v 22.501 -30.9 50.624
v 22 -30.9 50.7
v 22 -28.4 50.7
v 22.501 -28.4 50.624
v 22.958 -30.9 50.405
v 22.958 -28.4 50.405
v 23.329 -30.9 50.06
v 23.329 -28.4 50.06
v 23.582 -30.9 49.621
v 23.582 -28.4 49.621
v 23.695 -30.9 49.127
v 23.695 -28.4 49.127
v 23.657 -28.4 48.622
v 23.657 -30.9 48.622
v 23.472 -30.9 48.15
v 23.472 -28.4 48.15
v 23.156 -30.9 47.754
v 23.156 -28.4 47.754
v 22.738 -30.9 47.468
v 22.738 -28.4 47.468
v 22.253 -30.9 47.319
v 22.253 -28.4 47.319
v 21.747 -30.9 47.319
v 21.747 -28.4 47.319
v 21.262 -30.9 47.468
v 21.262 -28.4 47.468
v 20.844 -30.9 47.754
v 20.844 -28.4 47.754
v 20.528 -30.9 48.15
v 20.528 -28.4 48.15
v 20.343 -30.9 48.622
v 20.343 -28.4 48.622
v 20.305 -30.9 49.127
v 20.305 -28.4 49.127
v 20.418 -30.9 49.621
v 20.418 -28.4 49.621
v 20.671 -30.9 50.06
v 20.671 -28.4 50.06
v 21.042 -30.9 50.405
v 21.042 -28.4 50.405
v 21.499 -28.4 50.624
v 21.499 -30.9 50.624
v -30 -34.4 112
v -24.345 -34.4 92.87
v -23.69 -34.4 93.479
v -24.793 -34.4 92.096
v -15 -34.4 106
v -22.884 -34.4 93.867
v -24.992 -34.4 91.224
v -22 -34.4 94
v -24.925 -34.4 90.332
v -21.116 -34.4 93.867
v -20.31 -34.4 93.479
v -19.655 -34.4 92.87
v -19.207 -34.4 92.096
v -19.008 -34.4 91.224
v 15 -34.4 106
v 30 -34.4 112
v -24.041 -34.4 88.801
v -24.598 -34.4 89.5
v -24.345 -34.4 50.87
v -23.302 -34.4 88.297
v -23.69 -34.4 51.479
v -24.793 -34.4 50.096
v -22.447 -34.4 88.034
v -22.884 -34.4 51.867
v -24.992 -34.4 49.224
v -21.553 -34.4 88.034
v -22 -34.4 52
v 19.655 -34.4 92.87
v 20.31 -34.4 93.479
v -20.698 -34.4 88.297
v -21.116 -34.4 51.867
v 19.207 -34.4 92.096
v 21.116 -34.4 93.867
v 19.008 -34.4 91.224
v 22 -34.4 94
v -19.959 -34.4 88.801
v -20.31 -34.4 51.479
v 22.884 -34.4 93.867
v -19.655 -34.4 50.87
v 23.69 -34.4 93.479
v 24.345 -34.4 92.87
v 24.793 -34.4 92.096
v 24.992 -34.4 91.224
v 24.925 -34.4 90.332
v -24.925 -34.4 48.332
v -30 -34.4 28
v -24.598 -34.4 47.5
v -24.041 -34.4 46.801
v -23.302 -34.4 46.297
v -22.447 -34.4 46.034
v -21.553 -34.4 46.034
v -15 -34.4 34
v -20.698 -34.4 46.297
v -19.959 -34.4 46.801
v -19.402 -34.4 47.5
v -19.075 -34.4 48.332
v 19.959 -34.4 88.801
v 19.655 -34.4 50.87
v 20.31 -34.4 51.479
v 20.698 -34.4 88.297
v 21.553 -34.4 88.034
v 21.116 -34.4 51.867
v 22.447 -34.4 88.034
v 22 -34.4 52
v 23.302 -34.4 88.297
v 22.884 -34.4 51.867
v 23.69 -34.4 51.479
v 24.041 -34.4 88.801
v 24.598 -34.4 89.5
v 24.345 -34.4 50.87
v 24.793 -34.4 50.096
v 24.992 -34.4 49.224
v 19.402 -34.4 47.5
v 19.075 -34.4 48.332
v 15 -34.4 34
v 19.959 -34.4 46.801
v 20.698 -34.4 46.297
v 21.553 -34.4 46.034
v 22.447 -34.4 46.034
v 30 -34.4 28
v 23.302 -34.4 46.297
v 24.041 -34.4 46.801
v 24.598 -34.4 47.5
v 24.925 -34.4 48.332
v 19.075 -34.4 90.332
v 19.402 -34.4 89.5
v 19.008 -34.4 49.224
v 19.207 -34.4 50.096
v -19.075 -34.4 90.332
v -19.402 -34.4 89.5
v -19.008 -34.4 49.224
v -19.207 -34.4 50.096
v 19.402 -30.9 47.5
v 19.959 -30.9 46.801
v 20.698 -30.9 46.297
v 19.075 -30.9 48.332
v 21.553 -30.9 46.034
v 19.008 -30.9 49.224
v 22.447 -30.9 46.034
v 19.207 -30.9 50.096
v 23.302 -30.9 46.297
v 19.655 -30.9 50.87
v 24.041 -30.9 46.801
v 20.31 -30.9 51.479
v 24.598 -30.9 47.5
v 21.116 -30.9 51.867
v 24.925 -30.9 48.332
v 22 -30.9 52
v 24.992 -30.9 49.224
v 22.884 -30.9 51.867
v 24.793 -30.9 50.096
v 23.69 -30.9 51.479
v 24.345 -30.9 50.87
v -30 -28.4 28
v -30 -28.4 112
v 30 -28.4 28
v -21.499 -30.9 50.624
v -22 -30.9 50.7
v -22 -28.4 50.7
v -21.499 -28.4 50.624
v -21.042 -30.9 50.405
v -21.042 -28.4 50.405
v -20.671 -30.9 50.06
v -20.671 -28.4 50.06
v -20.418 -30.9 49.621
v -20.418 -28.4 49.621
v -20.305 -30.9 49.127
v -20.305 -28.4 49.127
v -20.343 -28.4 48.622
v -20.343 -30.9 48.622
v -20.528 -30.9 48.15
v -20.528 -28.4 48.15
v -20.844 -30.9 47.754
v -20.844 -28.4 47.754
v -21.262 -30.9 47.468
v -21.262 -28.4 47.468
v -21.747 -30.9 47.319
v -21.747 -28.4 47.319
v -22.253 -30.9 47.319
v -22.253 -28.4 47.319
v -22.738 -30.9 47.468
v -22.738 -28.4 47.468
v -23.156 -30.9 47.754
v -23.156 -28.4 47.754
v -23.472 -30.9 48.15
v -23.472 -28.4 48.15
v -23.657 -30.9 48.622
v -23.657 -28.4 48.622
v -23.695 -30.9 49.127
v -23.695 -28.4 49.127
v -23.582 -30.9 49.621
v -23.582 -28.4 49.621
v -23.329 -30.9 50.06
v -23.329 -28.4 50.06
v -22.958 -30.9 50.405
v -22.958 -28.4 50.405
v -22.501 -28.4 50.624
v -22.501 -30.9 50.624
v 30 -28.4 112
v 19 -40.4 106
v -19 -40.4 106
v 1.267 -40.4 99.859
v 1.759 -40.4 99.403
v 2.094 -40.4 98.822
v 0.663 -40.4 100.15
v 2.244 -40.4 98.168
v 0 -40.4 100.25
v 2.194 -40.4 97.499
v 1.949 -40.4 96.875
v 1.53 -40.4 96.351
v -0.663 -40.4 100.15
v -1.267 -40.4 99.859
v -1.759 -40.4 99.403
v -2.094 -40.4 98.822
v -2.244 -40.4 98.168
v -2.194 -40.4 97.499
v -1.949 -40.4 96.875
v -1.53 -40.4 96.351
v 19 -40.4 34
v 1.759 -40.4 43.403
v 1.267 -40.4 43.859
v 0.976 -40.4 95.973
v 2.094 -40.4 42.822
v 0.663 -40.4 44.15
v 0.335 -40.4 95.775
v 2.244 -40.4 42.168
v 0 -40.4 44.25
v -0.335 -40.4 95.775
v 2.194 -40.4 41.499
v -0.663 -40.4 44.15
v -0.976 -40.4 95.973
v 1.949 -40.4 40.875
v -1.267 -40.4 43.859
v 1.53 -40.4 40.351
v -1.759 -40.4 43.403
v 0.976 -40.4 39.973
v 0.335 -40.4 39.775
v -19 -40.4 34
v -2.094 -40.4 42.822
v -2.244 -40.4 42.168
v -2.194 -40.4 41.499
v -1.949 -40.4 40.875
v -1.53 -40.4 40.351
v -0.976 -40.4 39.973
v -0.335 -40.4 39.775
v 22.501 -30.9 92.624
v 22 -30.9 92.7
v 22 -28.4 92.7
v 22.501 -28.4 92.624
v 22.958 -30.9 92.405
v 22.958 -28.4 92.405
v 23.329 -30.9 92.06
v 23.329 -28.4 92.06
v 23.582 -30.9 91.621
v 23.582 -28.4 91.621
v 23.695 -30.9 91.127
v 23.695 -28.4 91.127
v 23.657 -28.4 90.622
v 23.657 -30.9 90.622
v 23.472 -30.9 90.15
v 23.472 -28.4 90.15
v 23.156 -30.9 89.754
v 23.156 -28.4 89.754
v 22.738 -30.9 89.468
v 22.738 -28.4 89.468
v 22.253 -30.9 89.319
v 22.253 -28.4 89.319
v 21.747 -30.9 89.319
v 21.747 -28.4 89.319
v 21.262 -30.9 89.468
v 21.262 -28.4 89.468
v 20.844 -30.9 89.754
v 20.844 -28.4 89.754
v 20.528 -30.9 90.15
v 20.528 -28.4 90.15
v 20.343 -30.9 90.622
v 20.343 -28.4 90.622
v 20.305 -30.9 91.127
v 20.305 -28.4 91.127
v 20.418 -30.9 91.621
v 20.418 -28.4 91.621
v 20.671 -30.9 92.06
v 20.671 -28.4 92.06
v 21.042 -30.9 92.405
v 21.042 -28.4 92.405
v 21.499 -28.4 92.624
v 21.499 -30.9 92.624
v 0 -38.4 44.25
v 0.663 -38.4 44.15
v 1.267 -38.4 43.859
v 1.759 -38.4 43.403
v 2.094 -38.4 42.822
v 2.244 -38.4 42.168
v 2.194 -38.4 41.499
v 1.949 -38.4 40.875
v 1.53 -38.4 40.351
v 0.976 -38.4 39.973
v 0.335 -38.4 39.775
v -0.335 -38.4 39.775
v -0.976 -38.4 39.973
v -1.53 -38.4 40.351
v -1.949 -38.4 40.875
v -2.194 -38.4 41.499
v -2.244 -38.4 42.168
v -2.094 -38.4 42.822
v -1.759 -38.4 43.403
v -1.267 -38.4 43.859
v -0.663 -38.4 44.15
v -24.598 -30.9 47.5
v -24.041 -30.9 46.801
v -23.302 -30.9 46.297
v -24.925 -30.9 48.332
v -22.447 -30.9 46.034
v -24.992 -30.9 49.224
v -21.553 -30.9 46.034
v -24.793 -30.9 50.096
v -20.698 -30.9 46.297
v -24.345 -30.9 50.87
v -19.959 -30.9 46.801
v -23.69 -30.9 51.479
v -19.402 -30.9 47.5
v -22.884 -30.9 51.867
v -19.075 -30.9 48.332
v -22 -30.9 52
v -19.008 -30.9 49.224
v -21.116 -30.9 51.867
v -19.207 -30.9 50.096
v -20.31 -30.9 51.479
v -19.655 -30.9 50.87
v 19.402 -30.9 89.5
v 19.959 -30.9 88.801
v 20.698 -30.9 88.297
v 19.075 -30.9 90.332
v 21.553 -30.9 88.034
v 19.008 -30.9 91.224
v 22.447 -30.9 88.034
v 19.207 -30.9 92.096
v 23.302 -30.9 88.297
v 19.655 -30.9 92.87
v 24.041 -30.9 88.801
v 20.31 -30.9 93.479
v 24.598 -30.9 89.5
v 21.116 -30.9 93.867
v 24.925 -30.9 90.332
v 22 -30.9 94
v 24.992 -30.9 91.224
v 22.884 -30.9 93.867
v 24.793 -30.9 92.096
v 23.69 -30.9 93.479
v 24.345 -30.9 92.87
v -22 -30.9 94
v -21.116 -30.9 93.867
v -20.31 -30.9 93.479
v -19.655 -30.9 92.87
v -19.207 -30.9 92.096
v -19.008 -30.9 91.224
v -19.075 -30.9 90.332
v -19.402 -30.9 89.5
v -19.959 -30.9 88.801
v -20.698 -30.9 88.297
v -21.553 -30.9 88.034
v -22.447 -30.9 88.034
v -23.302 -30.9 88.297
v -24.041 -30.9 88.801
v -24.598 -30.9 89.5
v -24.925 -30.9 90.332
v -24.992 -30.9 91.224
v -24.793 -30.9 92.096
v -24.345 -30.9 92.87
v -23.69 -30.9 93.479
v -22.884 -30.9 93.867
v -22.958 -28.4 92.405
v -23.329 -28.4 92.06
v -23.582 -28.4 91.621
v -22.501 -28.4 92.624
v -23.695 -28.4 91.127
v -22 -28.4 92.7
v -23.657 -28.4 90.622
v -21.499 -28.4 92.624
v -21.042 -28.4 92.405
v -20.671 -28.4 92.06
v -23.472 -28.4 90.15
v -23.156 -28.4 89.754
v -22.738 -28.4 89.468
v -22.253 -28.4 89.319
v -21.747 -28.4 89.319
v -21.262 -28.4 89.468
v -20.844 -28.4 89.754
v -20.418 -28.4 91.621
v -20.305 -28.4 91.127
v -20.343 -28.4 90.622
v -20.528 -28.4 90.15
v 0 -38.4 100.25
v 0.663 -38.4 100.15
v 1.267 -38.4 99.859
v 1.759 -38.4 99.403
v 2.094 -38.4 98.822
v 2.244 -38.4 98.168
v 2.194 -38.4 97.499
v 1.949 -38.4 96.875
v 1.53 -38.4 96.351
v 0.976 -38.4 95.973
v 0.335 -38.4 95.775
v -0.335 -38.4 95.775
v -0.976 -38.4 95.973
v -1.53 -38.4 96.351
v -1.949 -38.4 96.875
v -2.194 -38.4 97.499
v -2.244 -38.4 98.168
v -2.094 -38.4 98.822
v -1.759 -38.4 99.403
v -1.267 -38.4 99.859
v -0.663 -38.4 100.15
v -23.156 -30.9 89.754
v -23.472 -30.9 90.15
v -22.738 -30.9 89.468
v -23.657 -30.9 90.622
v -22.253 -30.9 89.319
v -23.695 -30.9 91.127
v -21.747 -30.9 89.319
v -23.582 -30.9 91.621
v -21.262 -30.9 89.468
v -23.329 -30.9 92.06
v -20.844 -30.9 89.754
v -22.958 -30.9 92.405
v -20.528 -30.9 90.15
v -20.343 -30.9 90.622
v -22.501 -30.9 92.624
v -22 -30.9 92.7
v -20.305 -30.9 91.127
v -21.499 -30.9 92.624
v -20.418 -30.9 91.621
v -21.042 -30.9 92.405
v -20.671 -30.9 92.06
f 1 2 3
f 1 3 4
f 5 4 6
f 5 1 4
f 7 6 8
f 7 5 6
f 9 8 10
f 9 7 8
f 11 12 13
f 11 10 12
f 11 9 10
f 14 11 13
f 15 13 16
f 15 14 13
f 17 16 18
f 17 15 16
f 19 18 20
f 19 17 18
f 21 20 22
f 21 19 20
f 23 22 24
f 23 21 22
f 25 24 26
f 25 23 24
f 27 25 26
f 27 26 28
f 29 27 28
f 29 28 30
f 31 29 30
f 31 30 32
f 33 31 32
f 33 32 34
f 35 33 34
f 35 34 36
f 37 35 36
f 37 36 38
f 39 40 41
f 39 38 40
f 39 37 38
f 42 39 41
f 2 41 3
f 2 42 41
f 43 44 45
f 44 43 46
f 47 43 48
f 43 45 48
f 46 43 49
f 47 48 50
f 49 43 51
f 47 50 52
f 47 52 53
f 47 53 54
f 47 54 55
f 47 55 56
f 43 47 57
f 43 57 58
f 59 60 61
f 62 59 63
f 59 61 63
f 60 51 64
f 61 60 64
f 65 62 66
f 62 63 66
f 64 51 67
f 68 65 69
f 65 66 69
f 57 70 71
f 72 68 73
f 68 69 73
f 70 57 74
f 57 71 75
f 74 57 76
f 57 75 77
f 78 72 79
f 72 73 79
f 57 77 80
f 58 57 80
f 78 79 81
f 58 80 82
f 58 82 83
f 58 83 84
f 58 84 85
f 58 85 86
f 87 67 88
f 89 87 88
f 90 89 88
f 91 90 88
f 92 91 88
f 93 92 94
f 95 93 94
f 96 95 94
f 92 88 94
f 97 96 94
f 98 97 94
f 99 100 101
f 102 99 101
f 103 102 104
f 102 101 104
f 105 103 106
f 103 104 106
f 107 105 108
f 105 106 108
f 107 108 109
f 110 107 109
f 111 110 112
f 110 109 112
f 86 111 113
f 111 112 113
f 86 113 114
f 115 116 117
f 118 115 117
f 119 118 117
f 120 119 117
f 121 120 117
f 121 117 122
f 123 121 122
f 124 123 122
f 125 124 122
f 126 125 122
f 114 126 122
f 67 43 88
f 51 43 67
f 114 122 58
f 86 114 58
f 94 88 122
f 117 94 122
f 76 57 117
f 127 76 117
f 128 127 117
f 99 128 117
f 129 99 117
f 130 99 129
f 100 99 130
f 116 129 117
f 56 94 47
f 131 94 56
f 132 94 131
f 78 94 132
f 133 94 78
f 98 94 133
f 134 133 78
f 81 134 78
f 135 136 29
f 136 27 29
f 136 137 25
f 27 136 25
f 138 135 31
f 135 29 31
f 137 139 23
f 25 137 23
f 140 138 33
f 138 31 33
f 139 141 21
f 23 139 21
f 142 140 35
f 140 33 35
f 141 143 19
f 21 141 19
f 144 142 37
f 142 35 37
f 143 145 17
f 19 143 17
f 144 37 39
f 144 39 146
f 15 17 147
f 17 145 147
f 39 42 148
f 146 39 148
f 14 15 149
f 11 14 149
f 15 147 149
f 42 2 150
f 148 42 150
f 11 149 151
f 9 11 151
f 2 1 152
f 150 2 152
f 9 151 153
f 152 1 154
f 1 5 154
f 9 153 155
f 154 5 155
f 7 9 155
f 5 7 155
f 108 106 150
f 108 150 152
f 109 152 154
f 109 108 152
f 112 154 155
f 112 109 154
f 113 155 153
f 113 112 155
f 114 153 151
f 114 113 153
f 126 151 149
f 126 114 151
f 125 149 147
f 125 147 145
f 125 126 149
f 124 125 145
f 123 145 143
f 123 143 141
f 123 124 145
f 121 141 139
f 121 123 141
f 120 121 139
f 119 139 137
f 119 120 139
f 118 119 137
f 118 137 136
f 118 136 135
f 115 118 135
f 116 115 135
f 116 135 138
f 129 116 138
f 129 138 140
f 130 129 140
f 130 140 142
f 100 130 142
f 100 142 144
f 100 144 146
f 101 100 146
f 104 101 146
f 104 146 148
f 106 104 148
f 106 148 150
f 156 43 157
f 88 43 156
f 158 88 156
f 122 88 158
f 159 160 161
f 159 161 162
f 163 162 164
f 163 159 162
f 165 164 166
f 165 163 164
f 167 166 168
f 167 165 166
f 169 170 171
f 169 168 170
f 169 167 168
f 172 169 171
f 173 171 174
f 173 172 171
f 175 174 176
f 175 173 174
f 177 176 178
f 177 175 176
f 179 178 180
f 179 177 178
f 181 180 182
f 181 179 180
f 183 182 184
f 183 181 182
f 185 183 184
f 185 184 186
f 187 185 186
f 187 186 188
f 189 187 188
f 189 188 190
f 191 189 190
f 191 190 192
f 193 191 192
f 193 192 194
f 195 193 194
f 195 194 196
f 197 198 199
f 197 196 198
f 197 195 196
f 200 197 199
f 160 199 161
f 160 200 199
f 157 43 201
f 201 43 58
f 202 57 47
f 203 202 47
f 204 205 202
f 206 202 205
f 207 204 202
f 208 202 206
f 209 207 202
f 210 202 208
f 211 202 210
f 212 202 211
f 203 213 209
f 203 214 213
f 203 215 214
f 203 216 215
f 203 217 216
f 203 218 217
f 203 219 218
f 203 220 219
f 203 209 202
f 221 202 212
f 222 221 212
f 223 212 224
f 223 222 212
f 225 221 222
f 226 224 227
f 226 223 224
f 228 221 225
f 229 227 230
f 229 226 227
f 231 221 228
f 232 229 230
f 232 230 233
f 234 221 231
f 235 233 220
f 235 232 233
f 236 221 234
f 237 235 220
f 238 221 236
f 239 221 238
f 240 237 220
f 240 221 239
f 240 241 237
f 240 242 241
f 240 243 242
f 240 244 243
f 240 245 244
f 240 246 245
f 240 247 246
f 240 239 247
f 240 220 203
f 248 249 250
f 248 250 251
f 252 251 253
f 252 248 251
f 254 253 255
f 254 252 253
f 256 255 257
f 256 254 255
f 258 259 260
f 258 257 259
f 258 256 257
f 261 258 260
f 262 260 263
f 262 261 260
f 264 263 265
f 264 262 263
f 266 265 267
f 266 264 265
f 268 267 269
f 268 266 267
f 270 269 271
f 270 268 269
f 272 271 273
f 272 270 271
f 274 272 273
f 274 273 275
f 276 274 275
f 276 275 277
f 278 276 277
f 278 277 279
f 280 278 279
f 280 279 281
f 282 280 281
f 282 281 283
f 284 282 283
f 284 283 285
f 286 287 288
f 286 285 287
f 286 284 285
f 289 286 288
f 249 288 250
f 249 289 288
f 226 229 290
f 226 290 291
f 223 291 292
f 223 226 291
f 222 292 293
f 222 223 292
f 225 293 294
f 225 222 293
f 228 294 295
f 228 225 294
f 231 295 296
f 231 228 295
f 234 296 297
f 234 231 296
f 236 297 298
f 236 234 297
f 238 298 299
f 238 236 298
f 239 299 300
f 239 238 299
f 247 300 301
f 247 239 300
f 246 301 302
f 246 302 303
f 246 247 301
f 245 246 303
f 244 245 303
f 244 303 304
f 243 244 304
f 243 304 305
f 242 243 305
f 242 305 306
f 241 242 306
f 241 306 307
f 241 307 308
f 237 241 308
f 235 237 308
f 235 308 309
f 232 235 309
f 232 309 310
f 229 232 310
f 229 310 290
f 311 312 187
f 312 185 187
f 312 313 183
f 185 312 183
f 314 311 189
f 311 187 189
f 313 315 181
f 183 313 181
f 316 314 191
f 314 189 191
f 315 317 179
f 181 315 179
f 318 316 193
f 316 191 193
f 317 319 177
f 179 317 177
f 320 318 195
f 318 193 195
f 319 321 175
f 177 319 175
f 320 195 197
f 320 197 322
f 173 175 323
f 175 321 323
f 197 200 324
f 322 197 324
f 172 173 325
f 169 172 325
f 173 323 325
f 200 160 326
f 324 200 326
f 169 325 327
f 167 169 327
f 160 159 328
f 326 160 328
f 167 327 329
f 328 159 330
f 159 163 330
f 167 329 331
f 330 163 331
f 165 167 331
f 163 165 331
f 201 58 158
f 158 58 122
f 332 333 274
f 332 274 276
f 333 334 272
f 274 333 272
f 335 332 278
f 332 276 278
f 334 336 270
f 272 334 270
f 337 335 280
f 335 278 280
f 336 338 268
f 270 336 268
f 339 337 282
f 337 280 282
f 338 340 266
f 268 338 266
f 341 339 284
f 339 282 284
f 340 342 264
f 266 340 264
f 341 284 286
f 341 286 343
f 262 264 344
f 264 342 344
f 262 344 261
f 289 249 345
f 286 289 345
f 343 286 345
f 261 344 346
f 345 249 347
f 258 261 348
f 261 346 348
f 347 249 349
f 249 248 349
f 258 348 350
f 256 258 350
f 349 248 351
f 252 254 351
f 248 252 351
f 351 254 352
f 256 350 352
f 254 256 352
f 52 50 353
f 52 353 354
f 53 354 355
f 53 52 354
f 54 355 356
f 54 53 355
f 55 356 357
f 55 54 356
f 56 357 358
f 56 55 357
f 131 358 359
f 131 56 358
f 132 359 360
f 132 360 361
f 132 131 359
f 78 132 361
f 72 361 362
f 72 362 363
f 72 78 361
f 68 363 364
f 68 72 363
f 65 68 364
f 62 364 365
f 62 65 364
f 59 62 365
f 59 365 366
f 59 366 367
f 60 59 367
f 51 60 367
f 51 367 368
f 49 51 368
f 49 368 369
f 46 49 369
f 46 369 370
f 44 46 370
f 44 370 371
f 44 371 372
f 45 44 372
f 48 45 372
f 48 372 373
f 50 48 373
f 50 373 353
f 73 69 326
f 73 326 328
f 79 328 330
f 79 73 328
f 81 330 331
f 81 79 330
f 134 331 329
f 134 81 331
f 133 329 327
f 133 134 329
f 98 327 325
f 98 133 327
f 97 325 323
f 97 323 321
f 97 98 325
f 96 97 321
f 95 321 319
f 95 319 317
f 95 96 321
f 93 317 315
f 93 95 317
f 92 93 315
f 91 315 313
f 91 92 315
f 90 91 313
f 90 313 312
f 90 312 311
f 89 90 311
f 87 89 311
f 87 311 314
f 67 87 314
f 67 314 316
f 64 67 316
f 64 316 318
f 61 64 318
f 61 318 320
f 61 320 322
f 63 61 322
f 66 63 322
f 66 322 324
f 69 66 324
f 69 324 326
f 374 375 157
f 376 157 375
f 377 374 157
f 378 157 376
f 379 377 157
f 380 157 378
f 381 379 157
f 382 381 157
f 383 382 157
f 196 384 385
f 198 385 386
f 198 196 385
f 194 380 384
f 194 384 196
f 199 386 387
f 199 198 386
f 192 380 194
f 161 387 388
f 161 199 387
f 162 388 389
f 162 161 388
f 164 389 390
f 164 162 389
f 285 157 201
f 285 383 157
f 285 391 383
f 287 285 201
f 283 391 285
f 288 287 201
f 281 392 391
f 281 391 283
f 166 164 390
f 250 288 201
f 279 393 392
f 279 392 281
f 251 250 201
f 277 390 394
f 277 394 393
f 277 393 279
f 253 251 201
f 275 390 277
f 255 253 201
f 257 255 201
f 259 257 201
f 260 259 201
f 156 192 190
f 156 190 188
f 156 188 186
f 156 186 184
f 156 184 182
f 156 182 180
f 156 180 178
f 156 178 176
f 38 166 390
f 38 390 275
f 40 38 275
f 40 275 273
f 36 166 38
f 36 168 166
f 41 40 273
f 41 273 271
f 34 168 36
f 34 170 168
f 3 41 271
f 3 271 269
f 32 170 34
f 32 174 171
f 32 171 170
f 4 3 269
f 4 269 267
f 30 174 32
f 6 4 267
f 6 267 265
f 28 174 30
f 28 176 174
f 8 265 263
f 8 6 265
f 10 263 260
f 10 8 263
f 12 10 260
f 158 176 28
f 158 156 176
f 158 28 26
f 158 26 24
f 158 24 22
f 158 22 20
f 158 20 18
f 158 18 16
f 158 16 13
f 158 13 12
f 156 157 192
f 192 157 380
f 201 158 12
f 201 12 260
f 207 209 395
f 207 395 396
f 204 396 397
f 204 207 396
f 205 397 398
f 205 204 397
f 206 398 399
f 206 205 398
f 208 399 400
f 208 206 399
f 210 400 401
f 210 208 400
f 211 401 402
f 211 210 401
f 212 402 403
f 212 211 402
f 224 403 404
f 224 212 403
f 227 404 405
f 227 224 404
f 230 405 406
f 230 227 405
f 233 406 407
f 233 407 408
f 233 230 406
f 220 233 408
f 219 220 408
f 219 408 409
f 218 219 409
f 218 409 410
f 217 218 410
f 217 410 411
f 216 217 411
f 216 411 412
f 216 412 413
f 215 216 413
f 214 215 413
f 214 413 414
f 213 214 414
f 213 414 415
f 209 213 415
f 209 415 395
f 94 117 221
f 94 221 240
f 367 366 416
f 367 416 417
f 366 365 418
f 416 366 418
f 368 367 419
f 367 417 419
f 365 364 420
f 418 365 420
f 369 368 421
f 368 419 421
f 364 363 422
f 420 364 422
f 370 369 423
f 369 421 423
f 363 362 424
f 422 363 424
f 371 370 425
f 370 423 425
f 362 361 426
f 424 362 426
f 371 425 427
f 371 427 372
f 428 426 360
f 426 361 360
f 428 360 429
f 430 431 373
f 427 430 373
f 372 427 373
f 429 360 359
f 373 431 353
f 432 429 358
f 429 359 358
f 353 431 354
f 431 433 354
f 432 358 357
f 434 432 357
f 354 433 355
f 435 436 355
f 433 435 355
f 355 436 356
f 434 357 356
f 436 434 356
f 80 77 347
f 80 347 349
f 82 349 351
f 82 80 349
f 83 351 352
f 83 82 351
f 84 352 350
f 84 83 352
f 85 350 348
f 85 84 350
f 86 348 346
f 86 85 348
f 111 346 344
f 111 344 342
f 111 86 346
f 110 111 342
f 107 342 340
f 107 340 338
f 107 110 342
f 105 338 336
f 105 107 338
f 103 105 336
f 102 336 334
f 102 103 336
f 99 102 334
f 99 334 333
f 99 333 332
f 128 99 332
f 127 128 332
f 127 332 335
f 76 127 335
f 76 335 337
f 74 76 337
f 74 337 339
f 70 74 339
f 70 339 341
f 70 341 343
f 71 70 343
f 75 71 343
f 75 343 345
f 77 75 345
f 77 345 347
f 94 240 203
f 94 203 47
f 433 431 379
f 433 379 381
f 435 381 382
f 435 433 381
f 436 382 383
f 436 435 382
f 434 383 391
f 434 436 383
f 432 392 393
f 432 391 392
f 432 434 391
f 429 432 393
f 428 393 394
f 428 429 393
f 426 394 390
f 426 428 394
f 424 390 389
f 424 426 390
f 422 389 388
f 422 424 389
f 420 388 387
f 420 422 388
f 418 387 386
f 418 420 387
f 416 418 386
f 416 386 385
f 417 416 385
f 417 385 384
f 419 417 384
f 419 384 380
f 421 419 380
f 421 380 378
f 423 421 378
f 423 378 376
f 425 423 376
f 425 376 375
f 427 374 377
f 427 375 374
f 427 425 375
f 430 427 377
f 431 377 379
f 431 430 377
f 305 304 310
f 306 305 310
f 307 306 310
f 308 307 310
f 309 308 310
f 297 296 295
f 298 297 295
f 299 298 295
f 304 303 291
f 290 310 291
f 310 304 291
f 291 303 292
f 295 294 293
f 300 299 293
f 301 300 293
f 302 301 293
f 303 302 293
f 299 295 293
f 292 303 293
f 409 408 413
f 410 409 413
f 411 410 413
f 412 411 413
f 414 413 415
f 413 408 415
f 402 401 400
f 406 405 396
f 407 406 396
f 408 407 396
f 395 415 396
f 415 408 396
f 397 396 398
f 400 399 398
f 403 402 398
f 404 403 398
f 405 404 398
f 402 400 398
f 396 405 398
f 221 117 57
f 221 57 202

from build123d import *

# Parameters (mm, degrees)
SKETCH1_W           = 60
SKETCH1_H           = 84
RAIL_PLATE_DEPTH    = 6
DOVETAIL_RAIL_DEPTH = 72
SKETCH3_R           = 1.7
M3_HOLES_DEPTH      = 7
SKETCH4_R           = 3
COUNTERBORES_DEPTH  = 4
SKETCH5_R           = 2.25
LOCK_DETENTS_DEPTH  = 2.5


with BuildPart() as part:
    # Sketch1 → Rail Plate (new body)
    with BuildSketch(Plane(origin=(0, -34.4, 0), x_dir=(1, 0, 0), z_dir=(0, 1, 0))):
        with Locations((0, -70)):
            Rectangle(SKETCH1_W, SKETCH1_H)
    extrude(amount=RAIL_PLATE_DEPTH)

    # Sketch2 → Dovetail Rail (add)
    with BuildSketch(Plane.XY.offset(34)):
        Polygon((-14.666666667, -33.9), (14.666666667, -33.9), (19, -40.4), (-19, -40.4), align=None)
    extrude(amount=DOVETAIL_RAIL_DEPTH)

    # Sketch3 → M3 Holes (cut)
    with BuildSketch(Plane(origin=(0, -34.9, 0), x_dir=(1, 0, 0), z_dir=(0, 1, 0))):
        with Locations(Location((-22, -91, 0), (0, 0, 270))):
            Circle(SKETCH3_R)
        with Locations(Location((-22, -49, 0), (0, 0, 270))):
            Circle(SKETCH3_R)
        with Locations(Location((22, -91, 0), (0, 0, 270))):
            Circle(SKETCH3_R)
        with Locations(Location((22, -49, 0), (0, 0, 270))):
            Circle(SKETCH3_R)
    extrude(amount=M3_HOLES_DEPTH, mode=Mode.SUBTRACT)

    # Sketch4 → Counterbores (cut)
    with BuildSketch(Plane(origin=(0, -34.9, 0), x_dir=(1, 0, 0), z_dir=(0, 1, 0))):
        with Locations(Location((-22, -91, 0), (0, 0, 270))):
            Circle(SKETCH4_R)
        with Locations(Location((-22, -49, 0), (0, 0, 270))):
            Circle(SKETCH4_R)
        with Locations(Location((22, -91, 0), (0, 0, 270))):
            Circle(SKETCH4_R)
        with Locations(Location((22, -49, 0), (0, 0, 270))):
            Circle(SKETCH4_R)
    extrude(amount=COUNTERBORES_DEPTH, mode=Mode.SUBTRACT)

    # Sketch5 → Lock Detents (cut)
    with BuildSketch(Plane(origin=(0, -40.9, 0), x_dir=(1, 0, 0), z_dir=(0, 1, 0))):
        with Locations(Location((0, -98, 0), (0, 0, 270))):
            Circle(SKETCH5_R)
        with Locations(Location((0, -42, 0), (0, 0, 270))):
            Circle(SKETCH5_R)
    extrude(amount=LOCK_DETENTS_DEPTH, mode=Mode.SUBTRACT)


solid = part.part
